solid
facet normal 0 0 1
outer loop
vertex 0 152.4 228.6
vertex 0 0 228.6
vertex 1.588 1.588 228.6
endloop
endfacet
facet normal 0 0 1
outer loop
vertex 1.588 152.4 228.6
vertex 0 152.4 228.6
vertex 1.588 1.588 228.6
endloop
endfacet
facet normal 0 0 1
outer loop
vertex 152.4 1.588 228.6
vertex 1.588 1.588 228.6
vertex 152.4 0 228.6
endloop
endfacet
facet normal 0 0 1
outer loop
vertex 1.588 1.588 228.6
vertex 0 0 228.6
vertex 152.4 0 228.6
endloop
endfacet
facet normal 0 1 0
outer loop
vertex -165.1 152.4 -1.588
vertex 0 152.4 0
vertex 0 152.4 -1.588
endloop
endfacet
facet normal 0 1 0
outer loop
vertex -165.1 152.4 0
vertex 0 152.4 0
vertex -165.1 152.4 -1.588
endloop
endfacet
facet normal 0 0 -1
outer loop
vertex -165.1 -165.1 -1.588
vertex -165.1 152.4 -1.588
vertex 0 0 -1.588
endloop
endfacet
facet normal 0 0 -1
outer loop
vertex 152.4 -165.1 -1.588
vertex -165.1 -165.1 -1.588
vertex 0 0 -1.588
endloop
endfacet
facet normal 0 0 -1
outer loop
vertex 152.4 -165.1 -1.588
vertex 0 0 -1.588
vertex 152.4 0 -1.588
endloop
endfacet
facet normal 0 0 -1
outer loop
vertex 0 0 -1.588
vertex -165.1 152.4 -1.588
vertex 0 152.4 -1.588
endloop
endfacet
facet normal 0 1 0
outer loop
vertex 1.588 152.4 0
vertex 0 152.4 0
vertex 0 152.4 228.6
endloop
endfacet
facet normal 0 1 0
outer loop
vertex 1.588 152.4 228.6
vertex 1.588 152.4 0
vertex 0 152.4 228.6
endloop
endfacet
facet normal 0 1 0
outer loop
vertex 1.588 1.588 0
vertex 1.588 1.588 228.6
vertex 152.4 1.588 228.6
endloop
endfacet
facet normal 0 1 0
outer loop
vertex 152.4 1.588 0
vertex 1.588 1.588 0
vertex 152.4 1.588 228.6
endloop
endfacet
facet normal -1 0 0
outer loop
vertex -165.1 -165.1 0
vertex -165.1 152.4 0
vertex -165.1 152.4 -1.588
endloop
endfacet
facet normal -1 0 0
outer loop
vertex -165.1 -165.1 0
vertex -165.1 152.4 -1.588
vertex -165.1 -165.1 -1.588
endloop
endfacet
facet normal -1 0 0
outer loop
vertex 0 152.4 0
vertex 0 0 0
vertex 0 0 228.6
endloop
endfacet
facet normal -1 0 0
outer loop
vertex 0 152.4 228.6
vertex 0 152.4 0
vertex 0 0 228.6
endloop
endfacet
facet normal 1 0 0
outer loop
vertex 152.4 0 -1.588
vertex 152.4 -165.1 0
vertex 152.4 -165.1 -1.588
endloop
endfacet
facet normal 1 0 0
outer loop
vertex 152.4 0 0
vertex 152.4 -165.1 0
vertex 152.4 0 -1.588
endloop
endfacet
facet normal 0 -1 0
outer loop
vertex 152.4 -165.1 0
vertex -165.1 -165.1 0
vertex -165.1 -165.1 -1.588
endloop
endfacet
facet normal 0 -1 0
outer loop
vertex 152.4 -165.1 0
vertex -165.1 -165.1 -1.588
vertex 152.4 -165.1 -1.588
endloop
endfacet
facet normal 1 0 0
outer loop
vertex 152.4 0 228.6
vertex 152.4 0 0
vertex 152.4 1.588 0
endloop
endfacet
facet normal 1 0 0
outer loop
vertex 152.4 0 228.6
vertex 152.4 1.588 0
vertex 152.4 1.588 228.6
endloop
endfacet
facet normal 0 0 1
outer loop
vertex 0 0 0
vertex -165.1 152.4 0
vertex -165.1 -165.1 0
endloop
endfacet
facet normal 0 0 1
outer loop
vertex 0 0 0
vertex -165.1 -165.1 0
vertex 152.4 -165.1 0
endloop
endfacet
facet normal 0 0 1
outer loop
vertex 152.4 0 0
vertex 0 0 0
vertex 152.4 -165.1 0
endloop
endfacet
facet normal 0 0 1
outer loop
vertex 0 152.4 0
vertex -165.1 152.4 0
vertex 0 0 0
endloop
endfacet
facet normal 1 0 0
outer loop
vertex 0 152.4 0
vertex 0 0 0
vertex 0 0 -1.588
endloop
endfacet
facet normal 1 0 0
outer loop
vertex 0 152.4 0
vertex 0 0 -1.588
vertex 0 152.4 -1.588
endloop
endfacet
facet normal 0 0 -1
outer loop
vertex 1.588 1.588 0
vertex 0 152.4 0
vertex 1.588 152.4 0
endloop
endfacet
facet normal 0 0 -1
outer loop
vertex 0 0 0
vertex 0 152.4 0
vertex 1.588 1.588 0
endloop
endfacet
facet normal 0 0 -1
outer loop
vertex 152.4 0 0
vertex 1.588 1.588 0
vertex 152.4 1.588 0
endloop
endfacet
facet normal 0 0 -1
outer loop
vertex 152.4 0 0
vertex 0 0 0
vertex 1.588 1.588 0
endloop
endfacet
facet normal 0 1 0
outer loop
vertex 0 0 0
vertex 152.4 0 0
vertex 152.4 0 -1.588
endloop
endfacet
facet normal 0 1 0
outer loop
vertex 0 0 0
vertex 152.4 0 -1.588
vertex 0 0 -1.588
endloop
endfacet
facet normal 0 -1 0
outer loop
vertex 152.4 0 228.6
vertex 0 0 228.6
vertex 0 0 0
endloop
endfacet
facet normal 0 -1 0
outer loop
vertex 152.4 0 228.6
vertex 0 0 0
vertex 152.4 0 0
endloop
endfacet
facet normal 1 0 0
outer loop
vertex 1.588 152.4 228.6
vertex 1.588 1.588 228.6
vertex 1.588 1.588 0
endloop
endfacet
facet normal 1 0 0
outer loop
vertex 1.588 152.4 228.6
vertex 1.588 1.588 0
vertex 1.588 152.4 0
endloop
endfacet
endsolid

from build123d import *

# Parameters (mm, degrees)
F0_W     = 152.4
F0_H     = 228.6
F3_DEPTH = 1.5875
F1_W     = 152.4
F1_H     = 228.6
F4_DEPTH = 1.5875
F5_DEPTH = 1.5875


with BuildPart() as f3:
    # F0 (on Front) → F3 (new body)
    with BuildSketch(Plane.XZ):
        with Locations((76.2, 114.3)):
            Rectangle(F0_W, F0_H)
    extrude(amount=-F3_DEPTH)

    # F1 (on Right) → F4 (join)
    with BuildSketch(Plane.YZ):
        with Locations((76.2, 114.3)):
            Rectangle(F1_W, F1_H)
    extrude(amount=F4_DEPTH)


with BuildPart() as f5:
    # F2 (on Top) → F5 (new body)
    with BuildSketch(Plane.XY):
        Polygon((152.4, 0), (0, 0), (0, 152.4), (-165.1, 152.4), (-165.1, -165.1), (152.4, -165.1), align=None)
    extrude(amount=-F5_DEPTH)


solid = Compound([f3.part, f5.part])
